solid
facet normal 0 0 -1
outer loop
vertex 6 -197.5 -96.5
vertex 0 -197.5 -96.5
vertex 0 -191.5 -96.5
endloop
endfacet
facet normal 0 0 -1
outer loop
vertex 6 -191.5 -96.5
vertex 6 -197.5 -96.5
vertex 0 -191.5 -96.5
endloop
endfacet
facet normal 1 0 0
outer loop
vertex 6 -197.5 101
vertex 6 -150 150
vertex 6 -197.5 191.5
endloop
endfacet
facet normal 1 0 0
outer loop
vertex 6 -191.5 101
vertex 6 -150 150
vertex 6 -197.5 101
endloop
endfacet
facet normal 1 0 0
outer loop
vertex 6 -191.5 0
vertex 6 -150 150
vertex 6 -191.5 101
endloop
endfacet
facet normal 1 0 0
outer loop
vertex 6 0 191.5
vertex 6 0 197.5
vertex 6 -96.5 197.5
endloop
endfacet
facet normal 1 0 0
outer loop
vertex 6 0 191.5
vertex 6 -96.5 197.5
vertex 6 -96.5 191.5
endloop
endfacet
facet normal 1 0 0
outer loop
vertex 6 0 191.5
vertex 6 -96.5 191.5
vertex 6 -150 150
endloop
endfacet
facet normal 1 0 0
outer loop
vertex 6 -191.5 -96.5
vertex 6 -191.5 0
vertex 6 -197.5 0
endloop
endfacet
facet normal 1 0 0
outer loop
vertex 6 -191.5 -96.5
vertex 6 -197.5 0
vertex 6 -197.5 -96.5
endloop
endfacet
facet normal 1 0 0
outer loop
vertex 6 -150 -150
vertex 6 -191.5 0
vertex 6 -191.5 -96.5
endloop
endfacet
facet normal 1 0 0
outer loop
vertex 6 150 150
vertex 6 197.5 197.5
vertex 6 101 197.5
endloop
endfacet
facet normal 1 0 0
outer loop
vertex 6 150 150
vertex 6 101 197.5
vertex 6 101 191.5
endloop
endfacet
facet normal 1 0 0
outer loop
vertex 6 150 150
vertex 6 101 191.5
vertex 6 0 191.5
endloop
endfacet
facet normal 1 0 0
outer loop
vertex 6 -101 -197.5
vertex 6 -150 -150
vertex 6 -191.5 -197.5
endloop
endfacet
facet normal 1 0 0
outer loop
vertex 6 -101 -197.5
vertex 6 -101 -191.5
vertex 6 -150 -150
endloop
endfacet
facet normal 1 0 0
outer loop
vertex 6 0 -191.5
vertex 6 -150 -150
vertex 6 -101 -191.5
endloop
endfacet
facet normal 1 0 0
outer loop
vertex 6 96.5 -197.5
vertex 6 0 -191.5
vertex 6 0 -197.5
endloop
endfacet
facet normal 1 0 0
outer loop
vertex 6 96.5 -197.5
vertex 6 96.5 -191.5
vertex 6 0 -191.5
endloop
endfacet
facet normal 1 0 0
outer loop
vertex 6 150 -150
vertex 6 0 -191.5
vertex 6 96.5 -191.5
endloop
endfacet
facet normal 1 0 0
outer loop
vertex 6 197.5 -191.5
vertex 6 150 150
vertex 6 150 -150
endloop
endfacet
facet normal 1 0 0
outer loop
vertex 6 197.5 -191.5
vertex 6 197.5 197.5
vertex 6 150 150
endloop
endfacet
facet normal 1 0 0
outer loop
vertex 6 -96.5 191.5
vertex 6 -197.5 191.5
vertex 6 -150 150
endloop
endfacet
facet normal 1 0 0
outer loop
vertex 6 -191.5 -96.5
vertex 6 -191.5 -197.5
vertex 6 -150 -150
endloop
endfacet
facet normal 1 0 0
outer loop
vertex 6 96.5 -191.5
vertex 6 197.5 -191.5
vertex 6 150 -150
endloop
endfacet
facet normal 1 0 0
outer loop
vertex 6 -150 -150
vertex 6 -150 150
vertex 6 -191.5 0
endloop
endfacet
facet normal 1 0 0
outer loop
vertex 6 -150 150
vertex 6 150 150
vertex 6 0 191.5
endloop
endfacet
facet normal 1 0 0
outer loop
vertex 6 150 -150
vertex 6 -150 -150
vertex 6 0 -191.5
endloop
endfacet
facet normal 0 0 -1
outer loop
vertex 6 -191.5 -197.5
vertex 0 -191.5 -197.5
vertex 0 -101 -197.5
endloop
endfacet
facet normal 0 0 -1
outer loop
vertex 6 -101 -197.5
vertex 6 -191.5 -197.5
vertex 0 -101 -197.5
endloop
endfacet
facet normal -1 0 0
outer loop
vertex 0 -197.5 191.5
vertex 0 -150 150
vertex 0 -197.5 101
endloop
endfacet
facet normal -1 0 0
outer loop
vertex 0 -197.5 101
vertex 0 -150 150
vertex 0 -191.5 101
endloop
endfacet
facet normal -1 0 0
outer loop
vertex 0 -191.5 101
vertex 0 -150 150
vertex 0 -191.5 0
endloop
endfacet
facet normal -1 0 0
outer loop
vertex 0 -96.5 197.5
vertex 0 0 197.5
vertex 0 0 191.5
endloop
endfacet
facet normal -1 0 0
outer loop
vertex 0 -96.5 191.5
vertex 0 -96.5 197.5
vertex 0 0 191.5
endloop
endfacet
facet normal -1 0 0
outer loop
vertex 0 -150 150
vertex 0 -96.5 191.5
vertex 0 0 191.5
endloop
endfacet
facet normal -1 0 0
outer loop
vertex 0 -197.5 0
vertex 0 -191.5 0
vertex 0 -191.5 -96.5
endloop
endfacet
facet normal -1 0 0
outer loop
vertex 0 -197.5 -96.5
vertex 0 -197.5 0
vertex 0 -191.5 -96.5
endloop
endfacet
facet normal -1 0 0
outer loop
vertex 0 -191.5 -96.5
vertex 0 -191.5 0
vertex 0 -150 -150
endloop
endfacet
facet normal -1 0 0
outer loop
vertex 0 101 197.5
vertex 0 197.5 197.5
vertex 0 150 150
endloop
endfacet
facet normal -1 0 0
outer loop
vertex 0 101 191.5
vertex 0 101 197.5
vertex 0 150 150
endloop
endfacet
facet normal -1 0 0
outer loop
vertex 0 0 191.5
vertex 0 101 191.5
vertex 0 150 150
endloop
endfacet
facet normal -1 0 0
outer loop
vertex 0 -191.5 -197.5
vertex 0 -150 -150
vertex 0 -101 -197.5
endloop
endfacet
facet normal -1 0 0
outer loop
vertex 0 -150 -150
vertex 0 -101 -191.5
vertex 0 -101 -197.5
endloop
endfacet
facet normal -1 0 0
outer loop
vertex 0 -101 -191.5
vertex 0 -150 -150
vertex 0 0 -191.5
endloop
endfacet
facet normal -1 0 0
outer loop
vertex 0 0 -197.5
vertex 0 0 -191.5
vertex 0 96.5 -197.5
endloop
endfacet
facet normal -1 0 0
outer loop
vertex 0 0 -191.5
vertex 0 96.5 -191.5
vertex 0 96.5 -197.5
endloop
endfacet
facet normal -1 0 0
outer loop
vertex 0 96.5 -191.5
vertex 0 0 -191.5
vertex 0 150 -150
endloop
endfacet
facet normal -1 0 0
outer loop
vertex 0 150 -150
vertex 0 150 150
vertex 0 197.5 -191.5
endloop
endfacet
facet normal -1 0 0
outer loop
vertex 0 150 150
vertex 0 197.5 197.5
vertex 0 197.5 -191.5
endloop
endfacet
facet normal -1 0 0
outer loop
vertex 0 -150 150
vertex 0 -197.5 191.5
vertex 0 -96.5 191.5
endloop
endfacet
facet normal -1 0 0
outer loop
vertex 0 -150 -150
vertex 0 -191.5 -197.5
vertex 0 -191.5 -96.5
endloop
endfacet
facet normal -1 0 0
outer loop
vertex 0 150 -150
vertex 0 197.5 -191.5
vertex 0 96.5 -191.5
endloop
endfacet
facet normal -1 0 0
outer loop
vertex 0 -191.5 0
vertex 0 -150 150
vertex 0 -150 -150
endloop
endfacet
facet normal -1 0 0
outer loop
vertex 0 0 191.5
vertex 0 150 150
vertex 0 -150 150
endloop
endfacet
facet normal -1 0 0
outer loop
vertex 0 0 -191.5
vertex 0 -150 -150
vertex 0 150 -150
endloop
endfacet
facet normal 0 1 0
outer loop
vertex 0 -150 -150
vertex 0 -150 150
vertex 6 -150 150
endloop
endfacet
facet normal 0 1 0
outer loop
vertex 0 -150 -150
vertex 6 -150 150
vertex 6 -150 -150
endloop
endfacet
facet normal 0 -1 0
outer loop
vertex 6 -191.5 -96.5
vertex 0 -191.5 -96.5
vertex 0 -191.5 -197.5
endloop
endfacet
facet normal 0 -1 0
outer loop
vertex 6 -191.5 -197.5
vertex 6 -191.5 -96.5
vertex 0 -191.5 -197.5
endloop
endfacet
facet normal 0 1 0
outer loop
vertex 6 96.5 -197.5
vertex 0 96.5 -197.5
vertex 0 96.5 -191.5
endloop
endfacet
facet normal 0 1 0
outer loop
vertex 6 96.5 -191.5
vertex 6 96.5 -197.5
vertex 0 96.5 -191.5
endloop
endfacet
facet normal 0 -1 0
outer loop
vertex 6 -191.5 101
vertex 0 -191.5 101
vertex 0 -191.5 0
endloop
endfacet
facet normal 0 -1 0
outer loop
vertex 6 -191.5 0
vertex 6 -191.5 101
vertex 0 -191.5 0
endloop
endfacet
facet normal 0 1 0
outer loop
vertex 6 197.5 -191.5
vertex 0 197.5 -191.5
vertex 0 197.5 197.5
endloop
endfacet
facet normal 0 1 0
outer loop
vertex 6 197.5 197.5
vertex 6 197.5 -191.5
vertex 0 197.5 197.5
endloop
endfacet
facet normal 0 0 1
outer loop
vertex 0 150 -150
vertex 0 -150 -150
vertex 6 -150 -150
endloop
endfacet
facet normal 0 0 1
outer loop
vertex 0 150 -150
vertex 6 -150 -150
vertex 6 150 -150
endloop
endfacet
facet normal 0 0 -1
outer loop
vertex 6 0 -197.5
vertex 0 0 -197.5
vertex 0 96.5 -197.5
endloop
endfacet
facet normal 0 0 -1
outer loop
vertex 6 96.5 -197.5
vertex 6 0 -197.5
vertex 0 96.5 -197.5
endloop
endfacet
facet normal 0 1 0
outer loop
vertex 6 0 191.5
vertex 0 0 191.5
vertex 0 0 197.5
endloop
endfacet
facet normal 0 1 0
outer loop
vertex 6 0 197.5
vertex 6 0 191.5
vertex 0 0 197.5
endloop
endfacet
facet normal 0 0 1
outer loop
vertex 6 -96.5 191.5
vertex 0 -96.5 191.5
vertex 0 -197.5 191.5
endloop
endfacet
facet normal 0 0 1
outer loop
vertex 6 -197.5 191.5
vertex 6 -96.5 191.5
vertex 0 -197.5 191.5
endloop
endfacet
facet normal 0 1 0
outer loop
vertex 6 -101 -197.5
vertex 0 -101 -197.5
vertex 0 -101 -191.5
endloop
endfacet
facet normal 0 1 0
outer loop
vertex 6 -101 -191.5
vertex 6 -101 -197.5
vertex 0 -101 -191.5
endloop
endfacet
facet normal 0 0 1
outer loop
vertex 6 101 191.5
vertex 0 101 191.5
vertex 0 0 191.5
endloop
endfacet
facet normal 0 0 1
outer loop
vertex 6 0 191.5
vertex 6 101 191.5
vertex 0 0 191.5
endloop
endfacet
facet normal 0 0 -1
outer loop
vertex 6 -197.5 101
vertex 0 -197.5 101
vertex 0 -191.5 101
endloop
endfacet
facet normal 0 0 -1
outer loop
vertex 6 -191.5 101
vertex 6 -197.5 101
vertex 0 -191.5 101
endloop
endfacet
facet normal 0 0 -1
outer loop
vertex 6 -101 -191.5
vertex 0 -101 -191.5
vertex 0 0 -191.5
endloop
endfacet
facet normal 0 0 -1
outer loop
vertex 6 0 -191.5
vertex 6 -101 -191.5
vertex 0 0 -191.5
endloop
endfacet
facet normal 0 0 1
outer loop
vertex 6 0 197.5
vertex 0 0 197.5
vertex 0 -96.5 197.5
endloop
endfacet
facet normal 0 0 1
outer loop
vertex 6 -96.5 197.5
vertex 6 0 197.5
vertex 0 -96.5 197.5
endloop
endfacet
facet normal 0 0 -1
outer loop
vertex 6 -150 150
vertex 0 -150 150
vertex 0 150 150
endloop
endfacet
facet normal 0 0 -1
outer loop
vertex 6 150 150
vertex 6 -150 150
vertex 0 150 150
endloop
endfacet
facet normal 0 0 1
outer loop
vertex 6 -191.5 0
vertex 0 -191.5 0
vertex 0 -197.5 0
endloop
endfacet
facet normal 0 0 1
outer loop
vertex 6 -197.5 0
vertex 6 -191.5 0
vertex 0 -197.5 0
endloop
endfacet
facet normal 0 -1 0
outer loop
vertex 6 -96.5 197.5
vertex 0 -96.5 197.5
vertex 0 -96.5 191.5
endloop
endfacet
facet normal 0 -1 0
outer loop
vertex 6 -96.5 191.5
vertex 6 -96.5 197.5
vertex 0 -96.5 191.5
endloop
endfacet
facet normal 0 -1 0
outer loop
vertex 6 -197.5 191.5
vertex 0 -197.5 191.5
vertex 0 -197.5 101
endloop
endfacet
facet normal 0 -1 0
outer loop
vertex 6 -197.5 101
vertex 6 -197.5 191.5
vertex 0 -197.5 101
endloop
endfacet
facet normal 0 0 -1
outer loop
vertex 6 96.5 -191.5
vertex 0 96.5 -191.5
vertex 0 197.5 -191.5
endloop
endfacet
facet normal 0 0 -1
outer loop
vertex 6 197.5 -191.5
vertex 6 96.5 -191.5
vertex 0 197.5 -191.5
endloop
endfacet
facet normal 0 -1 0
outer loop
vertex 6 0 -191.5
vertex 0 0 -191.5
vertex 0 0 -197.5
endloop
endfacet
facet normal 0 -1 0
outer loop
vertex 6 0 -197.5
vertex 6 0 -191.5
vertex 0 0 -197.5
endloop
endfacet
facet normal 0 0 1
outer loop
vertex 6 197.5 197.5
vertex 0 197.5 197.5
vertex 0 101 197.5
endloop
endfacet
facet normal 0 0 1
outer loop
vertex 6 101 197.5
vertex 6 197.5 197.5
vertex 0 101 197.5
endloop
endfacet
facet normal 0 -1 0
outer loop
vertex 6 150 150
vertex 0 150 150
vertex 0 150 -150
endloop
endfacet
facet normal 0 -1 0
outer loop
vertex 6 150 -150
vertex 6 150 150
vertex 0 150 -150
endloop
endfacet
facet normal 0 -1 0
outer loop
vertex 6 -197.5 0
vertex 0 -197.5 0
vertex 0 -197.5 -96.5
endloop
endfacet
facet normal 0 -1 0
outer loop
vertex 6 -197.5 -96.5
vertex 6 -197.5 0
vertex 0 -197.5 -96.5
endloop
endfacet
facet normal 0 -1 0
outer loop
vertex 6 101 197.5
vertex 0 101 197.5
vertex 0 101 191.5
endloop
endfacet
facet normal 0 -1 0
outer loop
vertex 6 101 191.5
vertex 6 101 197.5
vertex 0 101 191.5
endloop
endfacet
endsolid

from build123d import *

# Parameters (mm, degrees)
SKETCH2_W           = 300
SKETCH2_H           = 300
BOSS_EXTRUDE2_DEPTH = 6


with BuildPart() as part:
    # Sketch2 → Boss-Extrude2 (new body)
    with BuildSketch(Plane(origin=(0, 0, 0), x_dir=(0, 0, -1), z_dir=(1, 0, 0))):
        Polygon((-191.5, -96.5), (-191.5, -197.5), (-101, -197.5), (-101, -191.5), (0, -191.5), (0, -197.5), (96.5, -197.5), (96.5, -191.5), (197.5, -191.5), (197.5, -101), (191.5, -101), (191.5, 0), (197.5, 0), (197.5, 96.5), (191.5, 96.5), (191.5, 197.5), (-197.5, 197.5), (-197.5, 101), (-191.5, 101), (-191.5, 0), (-197.5, 0), (-197.5, -96.5), align=None)
        Rectangle(SKETCH2_W, SKETCH2_H, mode=Mode.SUBTRACT)
    extrude(amount=BOSS_EXTRUDE2_DEPTH)


solid = part.part
